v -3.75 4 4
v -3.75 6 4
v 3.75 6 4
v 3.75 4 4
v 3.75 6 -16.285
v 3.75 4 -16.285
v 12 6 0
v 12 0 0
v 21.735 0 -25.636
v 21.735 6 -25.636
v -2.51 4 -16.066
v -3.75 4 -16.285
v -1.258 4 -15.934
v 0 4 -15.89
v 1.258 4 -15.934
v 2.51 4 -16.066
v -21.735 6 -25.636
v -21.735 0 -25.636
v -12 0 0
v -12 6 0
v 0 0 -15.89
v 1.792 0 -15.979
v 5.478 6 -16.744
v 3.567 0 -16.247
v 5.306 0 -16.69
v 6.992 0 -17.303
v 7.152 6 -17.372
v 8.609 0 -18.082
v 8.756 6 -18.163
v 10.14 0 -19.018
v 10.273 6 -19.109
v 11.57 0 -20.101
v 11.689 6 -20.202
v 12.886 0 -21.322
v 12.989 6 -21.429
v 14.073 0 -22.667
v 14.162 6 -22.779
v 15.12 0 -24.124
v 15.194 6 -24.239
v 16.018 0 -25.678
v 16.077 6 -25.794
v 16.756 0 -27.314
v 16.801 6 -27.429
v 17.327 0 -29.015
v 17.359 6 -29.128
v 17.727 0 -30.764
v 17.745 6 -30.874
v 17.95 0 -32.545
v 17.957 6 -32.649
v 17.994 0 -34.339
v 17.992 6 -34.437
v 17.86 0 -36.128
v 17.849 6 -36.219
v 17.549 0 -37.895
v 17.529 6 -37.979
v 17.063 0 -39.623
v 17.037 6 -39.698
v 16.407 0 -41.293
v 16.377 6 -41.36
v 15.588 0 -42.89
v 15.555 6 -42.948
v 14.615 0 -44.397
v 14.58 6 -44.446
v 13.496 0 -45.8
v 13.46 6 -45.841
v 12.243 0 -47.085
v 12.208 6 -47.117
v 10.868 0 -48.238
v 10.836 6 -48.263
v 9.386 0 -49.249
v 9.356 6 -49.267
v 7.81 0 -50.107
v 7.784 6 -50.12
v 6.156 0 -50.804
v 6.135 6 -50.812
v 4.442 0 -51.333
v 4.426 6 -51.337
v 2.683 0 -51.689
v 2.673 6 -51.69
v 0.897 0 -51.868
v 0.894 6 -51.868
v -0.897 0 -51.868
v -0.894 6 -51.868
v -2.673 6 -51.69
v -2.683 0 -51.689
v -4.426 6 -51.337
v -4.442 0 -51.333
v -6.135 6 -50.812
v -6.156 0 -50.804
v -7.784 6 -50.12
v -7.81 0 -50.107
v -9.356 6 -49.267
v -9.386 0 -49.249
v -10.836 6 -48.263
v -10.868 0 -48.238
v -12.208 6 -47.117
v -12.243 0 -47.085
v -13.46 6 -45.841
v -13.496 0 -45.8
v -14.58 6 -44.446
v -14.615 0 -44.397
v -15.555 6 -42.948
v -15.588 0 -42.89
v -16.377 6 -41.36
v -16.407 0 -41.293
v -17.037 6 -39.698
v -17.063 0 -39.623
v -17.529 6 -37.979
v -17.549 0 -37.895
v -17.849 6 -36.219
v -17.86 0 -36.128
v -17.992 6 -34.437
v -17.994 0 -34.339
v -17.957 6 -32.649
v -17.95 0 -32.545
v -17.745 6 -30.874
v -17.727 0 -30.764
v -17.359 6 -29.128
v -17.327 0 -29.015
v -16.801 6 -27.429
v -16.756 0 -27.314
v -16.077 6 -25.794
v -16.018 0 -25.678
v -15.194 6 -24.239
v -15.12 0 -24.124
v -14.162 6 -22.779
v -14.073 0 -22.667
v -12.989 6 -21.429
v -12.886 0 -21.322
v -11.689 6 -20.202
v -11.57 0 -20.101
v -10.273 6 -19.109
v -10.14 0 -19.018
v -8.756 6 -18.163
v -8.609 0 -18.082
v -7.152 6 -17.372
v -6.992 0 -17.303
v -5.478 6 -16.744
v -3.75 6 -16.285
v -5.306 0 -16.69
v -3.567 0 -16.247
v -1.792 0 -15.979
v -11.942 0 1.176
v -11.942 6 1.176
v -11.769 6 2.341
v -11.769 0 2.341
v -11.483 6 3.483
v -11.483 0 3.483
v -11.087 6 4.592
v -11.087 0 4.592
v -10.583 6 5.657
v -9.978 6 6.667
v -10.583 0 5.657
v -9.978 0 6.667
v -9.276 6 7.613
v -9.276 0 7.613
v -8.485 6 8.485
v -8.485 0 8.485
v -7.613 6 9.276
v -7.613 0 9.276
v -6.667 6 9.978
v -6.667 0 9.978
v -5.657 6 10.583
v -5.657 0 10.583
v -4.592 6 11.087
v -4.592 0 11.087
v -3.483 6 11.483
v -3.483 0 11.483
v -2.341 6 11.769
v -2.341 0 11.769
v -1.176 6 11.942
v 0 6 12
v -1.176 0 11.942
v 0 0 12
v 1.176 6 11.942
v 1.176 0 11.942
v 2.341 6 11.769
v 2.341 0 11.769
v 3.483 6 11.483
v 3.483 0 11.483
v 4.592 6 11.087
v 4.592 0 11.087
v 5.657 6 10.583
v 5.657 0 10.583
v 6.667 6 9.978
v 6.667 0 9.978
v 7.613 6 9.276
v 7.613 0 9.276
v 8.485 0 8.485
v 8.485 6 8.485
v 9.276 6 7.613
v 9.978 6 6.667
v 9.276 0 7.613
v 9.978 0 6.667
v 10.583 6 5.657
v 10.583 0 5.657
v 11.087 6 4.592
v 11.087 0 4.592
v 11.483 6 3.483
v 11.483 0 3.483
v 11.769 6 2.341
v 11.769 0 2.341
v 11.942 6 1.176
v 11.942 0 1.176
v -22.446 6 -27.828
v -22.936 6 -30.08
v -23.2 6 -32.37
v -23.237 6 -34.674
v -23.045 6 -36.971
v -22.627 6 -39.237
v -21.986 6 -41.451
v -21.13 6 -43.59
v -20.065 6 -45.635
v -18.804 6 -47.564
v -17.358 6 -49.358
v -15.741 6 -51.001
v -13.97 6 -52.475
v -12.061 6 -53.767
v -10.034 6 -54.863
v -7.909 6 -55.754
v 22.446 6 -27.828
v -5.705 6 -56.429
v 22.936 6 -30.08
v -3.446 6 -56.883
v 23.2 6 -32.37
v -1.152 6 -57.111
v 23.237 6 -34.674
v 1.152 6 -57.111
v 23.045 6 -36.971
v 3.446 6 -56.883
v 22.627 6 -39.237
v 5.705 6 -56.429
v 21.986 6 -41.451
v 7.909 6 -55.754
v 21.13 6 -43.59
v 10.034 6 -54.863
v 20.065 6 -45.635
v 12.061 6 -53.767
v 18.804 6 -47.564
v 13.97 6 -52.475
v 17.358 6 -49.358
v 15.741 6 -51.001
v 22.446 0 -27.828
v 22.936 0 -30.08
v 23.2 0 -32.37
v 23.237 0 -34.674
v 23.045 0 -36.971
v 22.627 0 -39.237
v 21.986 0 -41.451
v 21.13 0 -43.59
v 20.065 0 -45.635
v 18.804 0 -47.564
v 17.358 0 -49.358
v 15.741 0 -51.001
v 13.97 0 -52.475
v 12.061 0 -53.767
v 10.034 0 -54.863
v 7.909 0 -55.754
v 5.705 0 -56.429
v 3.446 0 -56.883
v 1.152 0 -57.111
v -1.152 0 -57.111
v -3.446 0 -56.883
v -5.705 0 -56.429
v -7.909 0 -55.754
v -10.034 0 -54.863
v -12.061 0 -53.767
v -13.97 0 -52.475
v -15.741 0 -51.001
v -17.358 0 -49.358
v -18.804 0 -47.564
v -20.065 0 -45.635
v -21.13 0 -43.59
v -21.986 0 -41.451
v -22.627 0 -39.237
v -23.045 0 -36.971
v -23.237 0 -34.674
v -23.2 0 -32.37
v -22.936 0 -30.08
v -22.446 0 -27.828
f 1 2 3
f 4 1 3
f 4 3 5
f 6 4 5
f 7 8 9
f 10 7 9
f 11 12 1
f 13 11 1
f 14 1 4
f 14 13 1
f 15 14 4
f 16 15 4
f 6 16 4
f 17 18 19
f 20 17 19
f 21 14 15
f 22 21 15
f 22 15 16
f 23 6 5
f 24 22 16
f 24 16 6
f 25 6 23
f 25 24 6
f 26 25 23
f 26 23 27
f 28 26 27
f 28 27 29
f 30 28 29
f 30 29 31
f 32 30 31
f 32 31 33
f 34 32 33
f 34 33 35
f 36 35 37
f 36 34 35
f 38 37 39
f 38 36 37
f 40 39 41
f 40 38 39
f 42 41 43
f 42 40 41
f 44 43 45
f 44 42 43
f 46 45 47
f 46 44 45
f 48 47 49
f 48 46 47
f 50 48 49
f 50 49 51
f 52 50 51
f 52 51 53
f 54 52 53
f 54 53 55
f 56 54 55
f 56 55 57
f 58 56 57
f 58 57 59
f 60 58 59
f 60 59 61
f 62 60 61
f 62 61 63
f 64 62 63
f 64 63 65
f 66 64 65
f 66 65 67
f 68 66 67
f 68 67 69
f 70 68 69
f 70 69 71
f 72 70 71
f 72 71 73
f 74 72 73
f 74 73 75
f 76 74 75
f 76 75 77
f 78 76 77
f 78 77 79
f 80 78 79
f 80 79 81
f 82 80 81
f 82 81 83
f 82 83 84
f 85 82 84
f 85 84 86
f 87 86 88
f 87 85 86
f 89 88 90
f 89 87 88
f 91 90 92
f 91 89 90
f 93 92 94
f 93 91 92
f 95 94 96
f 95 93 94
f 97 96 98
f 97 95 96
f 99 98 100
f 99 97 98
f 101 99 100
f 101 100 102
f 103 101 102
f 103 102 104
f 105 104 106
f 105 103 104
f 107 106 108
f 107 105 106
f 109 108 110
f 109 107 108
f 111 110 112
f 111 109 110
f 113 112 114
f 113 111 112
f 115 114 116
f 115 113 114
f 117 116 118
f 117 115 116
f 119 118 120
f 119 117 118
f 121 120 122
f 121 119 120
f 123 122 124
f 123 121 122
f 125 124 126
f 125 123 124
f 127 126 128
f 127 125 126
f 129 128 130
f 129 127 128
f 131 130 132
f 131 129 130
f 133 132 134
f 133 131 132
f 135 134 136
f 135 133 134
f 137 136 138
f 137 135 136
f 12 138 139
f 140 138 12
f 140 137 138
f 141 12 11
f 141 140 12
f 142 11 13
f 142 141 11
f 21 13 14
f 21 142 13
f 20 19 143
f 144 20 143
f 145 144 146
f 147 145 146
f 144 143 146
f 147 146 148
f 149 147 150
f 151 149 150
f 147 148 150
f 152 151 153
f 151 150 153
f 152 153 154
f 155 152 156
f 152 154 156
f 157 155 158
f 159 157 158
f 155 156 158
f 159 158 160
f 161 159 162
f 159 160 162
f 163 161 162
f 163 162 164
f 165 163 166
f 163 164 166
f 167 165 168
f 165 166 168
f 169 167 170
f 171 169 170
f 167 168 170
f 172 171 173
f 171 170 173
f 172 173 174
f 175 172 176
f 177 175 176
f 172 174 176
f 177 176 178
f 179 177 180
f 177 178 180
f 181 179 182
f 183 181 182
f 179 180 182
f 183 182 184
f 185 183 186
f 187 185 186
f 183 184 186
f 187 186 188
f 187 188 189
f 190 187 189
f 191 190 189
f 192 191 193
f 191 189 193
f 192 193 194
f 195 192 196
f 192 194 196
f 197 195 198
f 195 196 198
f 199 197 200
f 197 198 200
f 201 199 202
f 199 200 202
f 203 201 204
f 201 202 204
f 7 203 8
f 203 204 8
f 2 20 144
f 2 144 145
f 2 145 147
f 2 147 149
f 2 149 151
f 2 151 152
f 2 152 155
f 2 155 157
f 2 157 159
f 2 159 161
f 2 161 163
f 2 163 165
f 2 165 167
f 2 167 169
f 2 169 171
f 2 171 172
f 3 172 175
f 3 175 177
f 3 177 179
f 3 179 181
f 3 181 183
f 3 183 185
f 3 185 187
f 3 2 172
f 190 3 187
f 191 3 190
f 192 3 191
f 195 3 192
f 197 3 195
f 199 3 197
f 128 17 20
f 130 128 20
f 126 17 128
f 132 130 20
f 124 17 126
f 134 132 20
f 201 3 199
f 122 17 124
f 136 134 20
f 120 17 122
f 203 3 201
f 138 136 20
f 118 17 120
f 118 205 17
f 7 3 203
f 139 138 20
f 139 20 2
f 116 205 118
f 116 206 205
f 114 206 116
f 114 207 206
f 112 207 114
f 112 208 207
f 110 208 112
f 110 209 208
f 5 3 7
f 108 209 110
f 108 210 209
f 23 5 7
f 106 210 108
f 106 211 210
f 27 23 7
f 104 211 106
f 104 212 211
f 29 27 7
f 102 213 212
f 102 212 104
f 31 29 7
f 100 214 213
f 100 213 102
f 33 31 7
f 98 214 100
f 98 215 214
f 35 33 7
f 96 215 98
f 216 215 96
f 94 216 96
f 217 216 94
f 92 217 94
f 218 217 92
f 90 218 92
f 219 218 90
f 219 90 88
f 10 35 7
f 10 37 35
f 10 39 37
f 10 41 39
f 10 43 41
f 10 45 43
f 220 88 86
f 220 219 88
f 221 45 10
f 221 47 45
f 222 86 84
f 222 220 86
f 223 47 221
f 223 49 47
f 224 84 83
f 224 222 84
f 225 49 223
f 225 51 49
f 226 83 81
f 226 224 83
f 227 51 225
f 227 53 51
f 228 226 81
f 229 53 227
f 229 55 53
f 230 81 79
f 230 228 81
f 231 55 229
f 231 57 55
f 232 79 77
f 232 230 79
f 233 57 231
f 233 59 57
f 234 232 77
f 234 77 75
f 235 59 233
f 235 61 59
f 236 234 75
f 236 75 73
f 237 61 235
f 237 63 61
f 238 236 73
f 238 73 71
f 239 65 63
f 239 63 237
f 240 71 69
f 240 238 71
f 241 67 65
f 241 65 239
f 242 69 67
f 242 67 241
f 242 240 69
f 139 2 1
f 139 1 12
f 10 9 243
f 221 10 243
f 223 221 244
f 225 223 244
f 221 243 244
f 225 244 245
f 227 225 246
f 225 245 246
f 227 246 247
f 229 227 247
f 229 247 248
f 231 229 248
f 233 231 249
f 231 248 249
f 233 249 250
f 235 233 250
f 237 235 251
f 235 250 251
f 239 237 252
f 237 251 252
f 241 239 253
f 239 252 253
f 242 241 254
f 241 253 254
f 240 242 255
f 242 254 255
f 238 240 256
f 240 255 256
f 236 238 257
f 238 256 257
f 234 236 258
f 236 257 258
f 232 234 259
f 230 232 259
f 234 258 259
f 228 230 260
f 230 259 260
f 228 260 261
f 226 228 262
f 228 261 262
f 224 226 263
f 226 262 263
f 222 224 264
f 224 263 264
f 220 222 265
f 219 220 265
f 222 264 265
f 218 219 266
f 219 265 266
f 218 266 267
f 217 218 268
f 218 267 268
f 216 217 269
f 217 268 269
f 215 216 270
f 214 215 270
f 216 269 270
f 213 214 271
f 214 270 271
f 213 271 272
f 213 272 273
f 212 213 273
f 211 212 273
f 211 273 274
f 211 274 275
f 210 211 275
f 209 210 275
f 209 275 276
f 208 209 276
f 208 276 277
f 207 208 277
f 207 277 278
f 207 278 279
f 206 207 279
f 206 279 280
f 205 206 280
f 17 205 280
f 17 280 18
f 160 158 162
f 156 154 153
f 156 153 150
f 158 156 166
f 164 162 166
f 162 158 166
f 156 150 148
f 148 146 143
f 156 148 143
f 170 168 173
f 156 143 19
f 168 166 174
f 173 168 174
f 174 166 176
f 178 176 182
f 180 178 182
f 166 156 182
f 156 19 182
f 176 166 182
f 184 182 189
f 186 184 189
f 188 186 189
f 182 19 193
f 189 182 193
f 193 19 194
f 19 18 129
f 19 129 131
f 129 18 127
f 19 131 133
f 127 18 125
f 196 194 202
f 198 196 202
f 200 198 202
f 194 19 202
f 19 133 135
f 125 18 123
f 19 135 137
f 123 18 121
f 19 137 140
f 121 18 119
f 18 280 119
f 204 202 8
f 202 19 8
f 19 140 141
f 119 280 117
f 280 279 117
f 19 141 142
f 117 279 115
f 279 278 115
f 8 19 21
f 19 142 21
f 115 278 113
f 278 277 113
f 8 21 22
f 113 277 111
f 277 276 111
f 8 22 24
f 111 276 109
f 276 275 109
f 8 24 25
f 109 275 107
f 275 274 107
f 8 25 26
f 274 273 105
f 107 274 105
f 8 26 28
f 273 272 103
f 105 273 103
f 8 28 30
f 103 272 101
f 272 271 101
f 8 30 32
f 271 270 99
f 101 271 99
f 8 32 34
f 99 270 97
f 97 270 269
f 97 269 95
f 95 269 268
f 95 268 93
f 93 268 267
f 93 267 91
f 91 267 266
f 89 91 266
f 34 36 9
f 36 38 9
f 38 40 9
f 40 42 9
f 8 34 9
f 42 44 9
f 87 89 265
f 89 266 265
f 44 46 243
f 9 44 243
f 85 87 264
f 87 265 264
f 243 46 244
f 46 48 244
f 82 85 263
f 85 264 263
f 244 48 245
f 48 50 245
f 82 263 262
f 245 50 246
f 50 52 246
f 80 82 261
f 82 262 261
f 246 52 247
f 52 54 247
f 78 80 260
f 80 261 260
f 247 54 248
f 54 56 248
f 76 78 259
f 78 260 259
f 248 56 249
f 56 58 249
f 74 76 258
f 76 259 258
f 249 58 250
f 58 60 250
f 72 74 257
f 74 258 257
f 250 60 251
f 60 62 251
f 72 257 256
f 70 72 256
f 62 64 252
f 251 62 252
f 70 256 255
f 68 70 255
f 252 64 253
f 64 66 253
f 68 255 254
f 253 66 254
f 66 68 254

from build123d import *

# Parameters (mm, degrees)
SKETCH1_R           = 18
BOSS_EXTRUDE1_DEPTH = 6
SKETCH2_W           = 7.5
SKETCH2_H           = 21
CUT_EXTRUDE1_DEPTH  = 2


with BuildPart() as part:
    # Sketch1 → Boss-Extrude1 (new body)
    with BuildSketch(Plane(origin=(0, 0, 0), x_dir=(1, 0, 0), z_dir=(0, 1, 0))):
        with BuildLine():
            Line((-21.73544452, 25.635731314), (-12, 0))
            ThreePointArc((-12, 0), (0, -12), (12, 0))
            Line((12, 0), (21.73544452, 25.635731314))
            ThreePointArc((21.73544452, 25.635731314), (0, 57.14), (-21.73544452, 25.635731314))
        make_face()
        with Locations(Location((0, 33.89, 0), (0, 0, 270))):
            Circle(SKETCH1_R, mode=Mode.SUBTRACT)
    extrude(amount=BOSS_EXTRUDE1_DEPTH)

    # Sketch2 → Cut-Extrude1 (cut)
    with BuildSketch(Plane(origin=(0, 6, 0), x_dir=(1, 0, 0), z_dir=(0, 1, 0))):
        with Locations((0, 6.5)):
            Rectangle(SKETCH2_W, SKETCH2_H)
    extrude(amount=-CUT_EXTRUDE1_DEPTH, mode=Mode.SUBTRACT)


solid = part.part
